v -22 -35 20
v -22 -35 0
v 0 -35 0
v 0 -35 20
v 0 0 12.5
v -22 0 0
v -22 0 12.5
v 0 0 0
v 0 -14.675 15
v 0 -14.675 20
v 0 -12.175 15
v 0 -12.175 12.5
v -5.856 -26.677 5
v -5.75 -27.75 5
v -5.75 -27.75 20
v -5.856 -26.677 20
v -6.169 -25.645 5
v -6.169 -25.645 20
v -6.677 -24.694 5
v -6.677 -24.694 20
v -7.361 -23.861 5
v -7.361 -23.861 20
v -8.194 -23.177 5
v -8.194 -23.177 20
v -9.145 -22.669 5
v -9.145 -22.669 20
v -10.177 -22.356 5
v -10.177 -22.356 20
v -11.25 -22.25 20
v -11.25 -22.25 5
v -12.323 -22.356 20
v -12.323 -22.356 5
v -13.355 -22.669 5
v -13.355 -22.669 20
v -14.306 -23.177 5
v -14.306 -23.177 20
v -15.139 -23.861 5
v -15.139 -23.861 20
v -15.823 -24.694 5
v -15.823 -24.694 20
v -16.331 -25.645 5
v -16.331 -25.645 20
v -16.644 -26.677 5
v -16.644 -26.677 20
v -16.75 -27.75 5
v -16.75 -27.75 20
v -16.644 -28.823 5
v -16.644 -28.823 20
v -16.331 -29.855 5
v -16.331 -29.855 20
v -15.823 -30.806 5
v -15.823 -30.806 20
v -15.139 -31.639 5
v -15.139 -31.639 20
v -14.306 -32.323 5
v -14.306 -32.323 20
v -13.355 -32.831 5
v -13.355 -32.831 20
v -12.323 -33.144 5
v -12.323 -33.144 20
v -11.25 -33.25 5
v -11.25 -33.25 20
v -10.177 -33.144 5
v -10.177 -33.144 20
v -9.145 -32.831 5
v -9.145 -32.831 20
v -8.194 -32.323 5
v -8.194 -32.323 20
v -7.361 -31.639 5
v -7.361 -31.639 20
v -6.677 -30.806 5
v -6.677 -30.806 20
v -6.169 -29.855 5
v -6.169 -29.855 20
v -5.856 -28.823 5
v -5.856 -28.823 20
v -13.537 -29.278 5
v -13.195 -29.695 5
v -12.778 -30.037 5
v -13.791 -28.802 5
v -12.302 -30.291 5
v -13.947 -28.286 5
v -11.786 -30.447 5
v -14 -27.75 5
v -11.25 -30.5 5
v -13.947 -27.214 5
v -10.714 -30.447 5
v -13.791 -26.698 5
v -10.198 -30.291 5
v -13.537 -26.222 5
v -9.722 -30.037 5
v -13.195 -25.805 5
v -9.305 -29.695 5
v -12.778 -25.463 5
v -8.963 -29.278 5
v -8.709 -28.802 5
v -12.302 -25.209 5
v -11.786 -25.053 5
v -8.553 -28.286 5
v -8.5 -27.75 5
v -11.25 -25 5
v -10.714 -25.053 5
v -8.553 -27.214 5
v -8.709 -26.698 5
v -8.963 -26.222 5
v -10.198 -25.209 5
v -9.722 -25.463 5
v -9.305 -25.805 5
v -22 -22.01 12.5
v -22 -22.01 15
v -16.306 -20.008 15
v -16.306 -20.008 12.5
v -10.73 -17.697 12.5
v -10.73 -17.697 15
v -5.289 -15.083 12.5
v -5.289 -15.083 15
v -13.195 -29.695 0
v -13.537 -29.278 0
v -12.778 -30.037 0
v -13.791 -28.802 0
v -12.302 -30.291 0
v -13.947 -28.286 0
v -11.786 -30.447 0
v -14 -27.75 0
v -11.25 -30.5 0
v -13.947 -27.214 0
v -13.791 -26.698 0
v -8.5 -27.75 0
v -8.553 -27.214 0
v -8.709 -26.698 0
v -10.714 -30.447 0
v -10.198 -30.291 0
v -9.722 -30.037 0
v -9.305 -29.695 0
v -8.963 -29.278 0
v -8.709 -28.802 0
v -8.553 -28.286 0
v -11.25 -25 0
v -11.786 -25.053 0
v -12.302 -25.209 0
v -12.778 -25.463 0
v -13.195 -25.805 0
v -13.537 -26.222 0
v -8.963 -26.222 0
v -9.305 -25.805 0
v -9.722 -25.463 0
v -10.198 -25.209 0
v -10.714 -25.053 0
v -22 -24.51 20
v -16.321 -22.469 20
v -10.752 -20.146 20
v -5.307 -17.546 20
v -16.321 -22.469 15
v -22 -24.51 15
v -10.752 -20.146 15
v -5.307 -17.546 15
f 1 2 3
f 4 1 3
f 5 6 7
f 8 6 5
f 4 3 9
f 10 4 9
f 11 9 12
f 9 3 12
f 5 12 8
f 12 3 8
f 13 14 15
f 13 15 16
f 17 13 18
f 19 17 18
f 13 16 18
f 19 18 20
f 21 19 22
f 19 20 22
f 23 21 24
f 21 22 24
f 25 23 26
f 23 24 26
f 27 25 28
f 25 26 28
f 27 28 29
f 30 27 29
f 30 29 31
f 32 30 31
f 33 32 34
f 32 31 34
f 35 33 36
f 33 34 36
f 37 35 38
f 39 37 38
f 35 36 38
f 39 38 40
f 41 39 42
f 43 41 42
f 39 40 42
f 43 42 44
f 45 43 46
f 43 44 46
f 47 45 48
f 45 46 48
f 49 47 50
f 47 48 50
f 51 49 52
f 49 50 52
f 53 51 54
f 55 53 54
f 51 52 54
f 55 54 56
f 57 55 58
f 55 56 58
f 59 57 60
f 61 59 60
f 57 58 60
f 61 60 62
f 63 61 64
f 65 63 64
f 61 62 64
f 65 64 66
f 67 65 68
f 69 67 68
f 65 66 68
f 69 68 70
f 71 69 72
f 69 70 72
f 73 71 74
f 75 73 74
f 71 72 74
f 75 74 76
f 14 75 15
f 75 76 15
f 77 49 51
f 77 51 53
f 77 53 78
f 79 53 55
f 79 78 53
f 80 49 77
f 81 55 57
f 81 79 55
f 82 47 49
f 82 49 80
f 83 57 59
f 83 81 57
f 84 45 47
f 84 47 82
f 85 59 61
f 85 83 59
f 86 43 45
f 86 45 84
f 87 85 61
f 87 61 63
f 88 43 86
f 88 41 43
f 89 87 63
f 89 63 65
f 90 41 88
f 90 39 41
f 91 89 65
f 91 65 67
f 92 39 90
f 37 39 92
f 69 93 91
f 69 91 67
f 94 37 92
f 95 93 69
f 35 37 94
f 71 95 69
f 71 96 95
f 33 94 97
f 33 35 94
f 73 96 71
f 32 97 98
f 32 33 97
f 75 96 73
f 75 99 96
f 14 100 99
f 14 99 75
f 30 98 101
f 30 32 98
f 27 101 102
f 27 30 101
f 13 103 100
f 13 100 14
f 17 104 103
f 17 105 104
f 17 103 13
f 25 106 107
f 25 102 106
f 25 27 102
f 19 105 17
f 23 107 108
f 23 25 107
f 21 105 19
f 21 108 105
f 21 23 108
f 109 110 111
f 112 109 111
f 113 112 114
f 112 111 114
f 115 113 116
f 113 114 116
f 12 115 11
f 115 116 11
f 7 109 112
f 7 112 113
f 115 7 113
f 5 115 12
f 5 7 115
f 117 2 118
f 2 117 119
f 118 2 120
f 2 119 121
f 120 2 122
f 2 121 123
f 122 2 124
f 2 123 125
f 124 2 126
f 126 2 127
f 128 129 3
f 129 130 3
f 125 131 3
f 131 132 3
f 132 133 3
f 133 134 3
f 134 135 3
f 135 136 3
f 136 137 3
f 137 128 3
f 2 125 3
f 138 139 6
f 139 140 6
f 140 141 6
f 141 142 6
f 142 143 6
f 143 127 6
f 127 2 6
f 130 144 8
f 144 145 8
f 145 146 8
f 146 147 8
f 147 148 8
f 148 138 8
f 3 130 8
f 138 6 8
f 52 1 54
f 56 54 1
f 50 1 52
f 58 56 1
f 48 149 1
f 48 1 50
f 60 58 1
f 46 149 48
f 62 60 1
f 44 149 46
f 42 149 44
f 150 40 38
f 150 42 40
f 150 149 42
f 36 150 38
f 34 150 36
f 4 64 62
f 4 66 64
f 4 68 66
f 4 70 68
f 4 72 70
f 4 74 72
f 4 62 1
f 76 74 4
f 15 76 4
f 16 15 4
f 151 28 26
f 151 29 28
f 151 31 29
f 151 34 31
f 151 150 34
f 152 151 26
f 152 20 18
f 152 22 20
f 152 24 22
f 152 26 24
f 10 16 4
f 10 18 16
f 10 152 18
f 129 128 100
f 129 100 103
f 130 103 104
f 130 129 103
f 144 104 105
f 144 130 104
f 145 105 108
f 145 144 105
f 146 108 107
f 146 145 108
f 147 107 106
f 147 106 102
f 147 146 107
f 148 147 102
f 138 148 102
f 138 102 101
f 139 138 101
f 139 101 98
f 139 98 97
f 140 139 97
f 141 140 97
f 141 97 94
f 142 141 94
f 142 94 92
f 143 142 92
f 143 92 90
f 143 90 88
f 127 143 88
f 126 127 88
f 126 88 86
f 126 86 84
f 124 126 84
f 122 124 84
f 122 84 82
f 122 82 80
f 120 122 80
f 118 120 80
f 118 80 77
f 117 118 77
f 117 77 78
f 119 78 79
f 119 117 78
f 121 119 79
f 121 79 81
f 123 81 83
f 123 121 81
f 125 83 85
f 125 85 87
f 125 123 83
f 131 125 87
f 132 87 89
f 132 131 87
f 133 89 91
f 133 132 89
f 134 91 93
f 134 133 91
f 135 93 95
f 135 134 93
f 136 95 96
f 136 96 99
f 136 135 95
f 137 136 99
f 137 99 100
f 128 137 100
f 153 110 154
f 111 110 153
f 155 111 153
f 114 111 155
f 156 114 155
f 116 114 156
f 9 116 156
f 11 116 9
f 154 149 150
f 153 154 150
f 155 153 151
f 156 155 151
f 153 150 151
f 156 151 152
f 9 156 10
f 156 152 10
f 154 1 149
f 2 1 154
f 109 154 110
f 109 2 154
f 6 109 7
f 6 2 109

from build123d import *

# Parameters (mm, degrees)
F0_W     = 22
F0_H     = 35
F0_R     = 2.75
F1_DEPTH = 20
F2_R     = 5.5
F2_R_2   = 2.75
F3_DEPTH = 15
F5_DEPTH = 5
F7_DEPTH = 2.5


with BuildPart() as f1:
    # F0 (on Top) → F1 (new body)
    with BuildSketch(Plane.XY):
        with Locations((-11, -17.5)):
            Rectangle(F0_W, F0_H)
        with Locations((-11.25, -27.75)):
            Circle(F0_R, mode=Mode.SUBTRACT)
    extrude(amount=F1_DEPTH)

    # F2 (on face) → F3 (cut)
    with BuildSketch(Plane.XY.offset(20)):
        with Locations((-11.25, -27.75)):
            Circle(F2_R)
        with Locations((-11.25, -27.75)):
            Circle(F2_R_2, mode=Mode.SUBTRACT)
    extrude(amount=-F3_DEPTH, mode=Mode.SUBTRACT)

    # F4 (on face) → F5 (cut)
    with BuildSketch(Plane.XY.offset(20)):
        with BuildLine():
            Line((0, 0), (-22, 0))
            Line((-22, 0), (-22, -24.509916256))
            ThreePointArc((-22, -24.509916256), (-10.7524902947, -20.1460276214), (0, -14.6748347853))
            Line((0, -14.6748347853), (0, 0))
        make_face()
    extrude(amount=-F5_DEPTH, mode=Mode.SUBTRACT)

    # F6 (on face) → F7 (cut)
    with BuildSketch(Plane.XY.offset(15)):
        with BuildLine():
            Line((0, 0), (-22, 0))
            Line((-22, 0), (-22, -22.009916256))
            ThreePointArc((-22, -22.009916256), (-10.7298589355, -17.696651493), (0, -12.1748347853))
            Line((0, -12.1748347853), (0, 0))
        make_face()
    extrude(amount=-F7_DEPTH, mode=Mode.SUBTRACT)


solid = f1.part
